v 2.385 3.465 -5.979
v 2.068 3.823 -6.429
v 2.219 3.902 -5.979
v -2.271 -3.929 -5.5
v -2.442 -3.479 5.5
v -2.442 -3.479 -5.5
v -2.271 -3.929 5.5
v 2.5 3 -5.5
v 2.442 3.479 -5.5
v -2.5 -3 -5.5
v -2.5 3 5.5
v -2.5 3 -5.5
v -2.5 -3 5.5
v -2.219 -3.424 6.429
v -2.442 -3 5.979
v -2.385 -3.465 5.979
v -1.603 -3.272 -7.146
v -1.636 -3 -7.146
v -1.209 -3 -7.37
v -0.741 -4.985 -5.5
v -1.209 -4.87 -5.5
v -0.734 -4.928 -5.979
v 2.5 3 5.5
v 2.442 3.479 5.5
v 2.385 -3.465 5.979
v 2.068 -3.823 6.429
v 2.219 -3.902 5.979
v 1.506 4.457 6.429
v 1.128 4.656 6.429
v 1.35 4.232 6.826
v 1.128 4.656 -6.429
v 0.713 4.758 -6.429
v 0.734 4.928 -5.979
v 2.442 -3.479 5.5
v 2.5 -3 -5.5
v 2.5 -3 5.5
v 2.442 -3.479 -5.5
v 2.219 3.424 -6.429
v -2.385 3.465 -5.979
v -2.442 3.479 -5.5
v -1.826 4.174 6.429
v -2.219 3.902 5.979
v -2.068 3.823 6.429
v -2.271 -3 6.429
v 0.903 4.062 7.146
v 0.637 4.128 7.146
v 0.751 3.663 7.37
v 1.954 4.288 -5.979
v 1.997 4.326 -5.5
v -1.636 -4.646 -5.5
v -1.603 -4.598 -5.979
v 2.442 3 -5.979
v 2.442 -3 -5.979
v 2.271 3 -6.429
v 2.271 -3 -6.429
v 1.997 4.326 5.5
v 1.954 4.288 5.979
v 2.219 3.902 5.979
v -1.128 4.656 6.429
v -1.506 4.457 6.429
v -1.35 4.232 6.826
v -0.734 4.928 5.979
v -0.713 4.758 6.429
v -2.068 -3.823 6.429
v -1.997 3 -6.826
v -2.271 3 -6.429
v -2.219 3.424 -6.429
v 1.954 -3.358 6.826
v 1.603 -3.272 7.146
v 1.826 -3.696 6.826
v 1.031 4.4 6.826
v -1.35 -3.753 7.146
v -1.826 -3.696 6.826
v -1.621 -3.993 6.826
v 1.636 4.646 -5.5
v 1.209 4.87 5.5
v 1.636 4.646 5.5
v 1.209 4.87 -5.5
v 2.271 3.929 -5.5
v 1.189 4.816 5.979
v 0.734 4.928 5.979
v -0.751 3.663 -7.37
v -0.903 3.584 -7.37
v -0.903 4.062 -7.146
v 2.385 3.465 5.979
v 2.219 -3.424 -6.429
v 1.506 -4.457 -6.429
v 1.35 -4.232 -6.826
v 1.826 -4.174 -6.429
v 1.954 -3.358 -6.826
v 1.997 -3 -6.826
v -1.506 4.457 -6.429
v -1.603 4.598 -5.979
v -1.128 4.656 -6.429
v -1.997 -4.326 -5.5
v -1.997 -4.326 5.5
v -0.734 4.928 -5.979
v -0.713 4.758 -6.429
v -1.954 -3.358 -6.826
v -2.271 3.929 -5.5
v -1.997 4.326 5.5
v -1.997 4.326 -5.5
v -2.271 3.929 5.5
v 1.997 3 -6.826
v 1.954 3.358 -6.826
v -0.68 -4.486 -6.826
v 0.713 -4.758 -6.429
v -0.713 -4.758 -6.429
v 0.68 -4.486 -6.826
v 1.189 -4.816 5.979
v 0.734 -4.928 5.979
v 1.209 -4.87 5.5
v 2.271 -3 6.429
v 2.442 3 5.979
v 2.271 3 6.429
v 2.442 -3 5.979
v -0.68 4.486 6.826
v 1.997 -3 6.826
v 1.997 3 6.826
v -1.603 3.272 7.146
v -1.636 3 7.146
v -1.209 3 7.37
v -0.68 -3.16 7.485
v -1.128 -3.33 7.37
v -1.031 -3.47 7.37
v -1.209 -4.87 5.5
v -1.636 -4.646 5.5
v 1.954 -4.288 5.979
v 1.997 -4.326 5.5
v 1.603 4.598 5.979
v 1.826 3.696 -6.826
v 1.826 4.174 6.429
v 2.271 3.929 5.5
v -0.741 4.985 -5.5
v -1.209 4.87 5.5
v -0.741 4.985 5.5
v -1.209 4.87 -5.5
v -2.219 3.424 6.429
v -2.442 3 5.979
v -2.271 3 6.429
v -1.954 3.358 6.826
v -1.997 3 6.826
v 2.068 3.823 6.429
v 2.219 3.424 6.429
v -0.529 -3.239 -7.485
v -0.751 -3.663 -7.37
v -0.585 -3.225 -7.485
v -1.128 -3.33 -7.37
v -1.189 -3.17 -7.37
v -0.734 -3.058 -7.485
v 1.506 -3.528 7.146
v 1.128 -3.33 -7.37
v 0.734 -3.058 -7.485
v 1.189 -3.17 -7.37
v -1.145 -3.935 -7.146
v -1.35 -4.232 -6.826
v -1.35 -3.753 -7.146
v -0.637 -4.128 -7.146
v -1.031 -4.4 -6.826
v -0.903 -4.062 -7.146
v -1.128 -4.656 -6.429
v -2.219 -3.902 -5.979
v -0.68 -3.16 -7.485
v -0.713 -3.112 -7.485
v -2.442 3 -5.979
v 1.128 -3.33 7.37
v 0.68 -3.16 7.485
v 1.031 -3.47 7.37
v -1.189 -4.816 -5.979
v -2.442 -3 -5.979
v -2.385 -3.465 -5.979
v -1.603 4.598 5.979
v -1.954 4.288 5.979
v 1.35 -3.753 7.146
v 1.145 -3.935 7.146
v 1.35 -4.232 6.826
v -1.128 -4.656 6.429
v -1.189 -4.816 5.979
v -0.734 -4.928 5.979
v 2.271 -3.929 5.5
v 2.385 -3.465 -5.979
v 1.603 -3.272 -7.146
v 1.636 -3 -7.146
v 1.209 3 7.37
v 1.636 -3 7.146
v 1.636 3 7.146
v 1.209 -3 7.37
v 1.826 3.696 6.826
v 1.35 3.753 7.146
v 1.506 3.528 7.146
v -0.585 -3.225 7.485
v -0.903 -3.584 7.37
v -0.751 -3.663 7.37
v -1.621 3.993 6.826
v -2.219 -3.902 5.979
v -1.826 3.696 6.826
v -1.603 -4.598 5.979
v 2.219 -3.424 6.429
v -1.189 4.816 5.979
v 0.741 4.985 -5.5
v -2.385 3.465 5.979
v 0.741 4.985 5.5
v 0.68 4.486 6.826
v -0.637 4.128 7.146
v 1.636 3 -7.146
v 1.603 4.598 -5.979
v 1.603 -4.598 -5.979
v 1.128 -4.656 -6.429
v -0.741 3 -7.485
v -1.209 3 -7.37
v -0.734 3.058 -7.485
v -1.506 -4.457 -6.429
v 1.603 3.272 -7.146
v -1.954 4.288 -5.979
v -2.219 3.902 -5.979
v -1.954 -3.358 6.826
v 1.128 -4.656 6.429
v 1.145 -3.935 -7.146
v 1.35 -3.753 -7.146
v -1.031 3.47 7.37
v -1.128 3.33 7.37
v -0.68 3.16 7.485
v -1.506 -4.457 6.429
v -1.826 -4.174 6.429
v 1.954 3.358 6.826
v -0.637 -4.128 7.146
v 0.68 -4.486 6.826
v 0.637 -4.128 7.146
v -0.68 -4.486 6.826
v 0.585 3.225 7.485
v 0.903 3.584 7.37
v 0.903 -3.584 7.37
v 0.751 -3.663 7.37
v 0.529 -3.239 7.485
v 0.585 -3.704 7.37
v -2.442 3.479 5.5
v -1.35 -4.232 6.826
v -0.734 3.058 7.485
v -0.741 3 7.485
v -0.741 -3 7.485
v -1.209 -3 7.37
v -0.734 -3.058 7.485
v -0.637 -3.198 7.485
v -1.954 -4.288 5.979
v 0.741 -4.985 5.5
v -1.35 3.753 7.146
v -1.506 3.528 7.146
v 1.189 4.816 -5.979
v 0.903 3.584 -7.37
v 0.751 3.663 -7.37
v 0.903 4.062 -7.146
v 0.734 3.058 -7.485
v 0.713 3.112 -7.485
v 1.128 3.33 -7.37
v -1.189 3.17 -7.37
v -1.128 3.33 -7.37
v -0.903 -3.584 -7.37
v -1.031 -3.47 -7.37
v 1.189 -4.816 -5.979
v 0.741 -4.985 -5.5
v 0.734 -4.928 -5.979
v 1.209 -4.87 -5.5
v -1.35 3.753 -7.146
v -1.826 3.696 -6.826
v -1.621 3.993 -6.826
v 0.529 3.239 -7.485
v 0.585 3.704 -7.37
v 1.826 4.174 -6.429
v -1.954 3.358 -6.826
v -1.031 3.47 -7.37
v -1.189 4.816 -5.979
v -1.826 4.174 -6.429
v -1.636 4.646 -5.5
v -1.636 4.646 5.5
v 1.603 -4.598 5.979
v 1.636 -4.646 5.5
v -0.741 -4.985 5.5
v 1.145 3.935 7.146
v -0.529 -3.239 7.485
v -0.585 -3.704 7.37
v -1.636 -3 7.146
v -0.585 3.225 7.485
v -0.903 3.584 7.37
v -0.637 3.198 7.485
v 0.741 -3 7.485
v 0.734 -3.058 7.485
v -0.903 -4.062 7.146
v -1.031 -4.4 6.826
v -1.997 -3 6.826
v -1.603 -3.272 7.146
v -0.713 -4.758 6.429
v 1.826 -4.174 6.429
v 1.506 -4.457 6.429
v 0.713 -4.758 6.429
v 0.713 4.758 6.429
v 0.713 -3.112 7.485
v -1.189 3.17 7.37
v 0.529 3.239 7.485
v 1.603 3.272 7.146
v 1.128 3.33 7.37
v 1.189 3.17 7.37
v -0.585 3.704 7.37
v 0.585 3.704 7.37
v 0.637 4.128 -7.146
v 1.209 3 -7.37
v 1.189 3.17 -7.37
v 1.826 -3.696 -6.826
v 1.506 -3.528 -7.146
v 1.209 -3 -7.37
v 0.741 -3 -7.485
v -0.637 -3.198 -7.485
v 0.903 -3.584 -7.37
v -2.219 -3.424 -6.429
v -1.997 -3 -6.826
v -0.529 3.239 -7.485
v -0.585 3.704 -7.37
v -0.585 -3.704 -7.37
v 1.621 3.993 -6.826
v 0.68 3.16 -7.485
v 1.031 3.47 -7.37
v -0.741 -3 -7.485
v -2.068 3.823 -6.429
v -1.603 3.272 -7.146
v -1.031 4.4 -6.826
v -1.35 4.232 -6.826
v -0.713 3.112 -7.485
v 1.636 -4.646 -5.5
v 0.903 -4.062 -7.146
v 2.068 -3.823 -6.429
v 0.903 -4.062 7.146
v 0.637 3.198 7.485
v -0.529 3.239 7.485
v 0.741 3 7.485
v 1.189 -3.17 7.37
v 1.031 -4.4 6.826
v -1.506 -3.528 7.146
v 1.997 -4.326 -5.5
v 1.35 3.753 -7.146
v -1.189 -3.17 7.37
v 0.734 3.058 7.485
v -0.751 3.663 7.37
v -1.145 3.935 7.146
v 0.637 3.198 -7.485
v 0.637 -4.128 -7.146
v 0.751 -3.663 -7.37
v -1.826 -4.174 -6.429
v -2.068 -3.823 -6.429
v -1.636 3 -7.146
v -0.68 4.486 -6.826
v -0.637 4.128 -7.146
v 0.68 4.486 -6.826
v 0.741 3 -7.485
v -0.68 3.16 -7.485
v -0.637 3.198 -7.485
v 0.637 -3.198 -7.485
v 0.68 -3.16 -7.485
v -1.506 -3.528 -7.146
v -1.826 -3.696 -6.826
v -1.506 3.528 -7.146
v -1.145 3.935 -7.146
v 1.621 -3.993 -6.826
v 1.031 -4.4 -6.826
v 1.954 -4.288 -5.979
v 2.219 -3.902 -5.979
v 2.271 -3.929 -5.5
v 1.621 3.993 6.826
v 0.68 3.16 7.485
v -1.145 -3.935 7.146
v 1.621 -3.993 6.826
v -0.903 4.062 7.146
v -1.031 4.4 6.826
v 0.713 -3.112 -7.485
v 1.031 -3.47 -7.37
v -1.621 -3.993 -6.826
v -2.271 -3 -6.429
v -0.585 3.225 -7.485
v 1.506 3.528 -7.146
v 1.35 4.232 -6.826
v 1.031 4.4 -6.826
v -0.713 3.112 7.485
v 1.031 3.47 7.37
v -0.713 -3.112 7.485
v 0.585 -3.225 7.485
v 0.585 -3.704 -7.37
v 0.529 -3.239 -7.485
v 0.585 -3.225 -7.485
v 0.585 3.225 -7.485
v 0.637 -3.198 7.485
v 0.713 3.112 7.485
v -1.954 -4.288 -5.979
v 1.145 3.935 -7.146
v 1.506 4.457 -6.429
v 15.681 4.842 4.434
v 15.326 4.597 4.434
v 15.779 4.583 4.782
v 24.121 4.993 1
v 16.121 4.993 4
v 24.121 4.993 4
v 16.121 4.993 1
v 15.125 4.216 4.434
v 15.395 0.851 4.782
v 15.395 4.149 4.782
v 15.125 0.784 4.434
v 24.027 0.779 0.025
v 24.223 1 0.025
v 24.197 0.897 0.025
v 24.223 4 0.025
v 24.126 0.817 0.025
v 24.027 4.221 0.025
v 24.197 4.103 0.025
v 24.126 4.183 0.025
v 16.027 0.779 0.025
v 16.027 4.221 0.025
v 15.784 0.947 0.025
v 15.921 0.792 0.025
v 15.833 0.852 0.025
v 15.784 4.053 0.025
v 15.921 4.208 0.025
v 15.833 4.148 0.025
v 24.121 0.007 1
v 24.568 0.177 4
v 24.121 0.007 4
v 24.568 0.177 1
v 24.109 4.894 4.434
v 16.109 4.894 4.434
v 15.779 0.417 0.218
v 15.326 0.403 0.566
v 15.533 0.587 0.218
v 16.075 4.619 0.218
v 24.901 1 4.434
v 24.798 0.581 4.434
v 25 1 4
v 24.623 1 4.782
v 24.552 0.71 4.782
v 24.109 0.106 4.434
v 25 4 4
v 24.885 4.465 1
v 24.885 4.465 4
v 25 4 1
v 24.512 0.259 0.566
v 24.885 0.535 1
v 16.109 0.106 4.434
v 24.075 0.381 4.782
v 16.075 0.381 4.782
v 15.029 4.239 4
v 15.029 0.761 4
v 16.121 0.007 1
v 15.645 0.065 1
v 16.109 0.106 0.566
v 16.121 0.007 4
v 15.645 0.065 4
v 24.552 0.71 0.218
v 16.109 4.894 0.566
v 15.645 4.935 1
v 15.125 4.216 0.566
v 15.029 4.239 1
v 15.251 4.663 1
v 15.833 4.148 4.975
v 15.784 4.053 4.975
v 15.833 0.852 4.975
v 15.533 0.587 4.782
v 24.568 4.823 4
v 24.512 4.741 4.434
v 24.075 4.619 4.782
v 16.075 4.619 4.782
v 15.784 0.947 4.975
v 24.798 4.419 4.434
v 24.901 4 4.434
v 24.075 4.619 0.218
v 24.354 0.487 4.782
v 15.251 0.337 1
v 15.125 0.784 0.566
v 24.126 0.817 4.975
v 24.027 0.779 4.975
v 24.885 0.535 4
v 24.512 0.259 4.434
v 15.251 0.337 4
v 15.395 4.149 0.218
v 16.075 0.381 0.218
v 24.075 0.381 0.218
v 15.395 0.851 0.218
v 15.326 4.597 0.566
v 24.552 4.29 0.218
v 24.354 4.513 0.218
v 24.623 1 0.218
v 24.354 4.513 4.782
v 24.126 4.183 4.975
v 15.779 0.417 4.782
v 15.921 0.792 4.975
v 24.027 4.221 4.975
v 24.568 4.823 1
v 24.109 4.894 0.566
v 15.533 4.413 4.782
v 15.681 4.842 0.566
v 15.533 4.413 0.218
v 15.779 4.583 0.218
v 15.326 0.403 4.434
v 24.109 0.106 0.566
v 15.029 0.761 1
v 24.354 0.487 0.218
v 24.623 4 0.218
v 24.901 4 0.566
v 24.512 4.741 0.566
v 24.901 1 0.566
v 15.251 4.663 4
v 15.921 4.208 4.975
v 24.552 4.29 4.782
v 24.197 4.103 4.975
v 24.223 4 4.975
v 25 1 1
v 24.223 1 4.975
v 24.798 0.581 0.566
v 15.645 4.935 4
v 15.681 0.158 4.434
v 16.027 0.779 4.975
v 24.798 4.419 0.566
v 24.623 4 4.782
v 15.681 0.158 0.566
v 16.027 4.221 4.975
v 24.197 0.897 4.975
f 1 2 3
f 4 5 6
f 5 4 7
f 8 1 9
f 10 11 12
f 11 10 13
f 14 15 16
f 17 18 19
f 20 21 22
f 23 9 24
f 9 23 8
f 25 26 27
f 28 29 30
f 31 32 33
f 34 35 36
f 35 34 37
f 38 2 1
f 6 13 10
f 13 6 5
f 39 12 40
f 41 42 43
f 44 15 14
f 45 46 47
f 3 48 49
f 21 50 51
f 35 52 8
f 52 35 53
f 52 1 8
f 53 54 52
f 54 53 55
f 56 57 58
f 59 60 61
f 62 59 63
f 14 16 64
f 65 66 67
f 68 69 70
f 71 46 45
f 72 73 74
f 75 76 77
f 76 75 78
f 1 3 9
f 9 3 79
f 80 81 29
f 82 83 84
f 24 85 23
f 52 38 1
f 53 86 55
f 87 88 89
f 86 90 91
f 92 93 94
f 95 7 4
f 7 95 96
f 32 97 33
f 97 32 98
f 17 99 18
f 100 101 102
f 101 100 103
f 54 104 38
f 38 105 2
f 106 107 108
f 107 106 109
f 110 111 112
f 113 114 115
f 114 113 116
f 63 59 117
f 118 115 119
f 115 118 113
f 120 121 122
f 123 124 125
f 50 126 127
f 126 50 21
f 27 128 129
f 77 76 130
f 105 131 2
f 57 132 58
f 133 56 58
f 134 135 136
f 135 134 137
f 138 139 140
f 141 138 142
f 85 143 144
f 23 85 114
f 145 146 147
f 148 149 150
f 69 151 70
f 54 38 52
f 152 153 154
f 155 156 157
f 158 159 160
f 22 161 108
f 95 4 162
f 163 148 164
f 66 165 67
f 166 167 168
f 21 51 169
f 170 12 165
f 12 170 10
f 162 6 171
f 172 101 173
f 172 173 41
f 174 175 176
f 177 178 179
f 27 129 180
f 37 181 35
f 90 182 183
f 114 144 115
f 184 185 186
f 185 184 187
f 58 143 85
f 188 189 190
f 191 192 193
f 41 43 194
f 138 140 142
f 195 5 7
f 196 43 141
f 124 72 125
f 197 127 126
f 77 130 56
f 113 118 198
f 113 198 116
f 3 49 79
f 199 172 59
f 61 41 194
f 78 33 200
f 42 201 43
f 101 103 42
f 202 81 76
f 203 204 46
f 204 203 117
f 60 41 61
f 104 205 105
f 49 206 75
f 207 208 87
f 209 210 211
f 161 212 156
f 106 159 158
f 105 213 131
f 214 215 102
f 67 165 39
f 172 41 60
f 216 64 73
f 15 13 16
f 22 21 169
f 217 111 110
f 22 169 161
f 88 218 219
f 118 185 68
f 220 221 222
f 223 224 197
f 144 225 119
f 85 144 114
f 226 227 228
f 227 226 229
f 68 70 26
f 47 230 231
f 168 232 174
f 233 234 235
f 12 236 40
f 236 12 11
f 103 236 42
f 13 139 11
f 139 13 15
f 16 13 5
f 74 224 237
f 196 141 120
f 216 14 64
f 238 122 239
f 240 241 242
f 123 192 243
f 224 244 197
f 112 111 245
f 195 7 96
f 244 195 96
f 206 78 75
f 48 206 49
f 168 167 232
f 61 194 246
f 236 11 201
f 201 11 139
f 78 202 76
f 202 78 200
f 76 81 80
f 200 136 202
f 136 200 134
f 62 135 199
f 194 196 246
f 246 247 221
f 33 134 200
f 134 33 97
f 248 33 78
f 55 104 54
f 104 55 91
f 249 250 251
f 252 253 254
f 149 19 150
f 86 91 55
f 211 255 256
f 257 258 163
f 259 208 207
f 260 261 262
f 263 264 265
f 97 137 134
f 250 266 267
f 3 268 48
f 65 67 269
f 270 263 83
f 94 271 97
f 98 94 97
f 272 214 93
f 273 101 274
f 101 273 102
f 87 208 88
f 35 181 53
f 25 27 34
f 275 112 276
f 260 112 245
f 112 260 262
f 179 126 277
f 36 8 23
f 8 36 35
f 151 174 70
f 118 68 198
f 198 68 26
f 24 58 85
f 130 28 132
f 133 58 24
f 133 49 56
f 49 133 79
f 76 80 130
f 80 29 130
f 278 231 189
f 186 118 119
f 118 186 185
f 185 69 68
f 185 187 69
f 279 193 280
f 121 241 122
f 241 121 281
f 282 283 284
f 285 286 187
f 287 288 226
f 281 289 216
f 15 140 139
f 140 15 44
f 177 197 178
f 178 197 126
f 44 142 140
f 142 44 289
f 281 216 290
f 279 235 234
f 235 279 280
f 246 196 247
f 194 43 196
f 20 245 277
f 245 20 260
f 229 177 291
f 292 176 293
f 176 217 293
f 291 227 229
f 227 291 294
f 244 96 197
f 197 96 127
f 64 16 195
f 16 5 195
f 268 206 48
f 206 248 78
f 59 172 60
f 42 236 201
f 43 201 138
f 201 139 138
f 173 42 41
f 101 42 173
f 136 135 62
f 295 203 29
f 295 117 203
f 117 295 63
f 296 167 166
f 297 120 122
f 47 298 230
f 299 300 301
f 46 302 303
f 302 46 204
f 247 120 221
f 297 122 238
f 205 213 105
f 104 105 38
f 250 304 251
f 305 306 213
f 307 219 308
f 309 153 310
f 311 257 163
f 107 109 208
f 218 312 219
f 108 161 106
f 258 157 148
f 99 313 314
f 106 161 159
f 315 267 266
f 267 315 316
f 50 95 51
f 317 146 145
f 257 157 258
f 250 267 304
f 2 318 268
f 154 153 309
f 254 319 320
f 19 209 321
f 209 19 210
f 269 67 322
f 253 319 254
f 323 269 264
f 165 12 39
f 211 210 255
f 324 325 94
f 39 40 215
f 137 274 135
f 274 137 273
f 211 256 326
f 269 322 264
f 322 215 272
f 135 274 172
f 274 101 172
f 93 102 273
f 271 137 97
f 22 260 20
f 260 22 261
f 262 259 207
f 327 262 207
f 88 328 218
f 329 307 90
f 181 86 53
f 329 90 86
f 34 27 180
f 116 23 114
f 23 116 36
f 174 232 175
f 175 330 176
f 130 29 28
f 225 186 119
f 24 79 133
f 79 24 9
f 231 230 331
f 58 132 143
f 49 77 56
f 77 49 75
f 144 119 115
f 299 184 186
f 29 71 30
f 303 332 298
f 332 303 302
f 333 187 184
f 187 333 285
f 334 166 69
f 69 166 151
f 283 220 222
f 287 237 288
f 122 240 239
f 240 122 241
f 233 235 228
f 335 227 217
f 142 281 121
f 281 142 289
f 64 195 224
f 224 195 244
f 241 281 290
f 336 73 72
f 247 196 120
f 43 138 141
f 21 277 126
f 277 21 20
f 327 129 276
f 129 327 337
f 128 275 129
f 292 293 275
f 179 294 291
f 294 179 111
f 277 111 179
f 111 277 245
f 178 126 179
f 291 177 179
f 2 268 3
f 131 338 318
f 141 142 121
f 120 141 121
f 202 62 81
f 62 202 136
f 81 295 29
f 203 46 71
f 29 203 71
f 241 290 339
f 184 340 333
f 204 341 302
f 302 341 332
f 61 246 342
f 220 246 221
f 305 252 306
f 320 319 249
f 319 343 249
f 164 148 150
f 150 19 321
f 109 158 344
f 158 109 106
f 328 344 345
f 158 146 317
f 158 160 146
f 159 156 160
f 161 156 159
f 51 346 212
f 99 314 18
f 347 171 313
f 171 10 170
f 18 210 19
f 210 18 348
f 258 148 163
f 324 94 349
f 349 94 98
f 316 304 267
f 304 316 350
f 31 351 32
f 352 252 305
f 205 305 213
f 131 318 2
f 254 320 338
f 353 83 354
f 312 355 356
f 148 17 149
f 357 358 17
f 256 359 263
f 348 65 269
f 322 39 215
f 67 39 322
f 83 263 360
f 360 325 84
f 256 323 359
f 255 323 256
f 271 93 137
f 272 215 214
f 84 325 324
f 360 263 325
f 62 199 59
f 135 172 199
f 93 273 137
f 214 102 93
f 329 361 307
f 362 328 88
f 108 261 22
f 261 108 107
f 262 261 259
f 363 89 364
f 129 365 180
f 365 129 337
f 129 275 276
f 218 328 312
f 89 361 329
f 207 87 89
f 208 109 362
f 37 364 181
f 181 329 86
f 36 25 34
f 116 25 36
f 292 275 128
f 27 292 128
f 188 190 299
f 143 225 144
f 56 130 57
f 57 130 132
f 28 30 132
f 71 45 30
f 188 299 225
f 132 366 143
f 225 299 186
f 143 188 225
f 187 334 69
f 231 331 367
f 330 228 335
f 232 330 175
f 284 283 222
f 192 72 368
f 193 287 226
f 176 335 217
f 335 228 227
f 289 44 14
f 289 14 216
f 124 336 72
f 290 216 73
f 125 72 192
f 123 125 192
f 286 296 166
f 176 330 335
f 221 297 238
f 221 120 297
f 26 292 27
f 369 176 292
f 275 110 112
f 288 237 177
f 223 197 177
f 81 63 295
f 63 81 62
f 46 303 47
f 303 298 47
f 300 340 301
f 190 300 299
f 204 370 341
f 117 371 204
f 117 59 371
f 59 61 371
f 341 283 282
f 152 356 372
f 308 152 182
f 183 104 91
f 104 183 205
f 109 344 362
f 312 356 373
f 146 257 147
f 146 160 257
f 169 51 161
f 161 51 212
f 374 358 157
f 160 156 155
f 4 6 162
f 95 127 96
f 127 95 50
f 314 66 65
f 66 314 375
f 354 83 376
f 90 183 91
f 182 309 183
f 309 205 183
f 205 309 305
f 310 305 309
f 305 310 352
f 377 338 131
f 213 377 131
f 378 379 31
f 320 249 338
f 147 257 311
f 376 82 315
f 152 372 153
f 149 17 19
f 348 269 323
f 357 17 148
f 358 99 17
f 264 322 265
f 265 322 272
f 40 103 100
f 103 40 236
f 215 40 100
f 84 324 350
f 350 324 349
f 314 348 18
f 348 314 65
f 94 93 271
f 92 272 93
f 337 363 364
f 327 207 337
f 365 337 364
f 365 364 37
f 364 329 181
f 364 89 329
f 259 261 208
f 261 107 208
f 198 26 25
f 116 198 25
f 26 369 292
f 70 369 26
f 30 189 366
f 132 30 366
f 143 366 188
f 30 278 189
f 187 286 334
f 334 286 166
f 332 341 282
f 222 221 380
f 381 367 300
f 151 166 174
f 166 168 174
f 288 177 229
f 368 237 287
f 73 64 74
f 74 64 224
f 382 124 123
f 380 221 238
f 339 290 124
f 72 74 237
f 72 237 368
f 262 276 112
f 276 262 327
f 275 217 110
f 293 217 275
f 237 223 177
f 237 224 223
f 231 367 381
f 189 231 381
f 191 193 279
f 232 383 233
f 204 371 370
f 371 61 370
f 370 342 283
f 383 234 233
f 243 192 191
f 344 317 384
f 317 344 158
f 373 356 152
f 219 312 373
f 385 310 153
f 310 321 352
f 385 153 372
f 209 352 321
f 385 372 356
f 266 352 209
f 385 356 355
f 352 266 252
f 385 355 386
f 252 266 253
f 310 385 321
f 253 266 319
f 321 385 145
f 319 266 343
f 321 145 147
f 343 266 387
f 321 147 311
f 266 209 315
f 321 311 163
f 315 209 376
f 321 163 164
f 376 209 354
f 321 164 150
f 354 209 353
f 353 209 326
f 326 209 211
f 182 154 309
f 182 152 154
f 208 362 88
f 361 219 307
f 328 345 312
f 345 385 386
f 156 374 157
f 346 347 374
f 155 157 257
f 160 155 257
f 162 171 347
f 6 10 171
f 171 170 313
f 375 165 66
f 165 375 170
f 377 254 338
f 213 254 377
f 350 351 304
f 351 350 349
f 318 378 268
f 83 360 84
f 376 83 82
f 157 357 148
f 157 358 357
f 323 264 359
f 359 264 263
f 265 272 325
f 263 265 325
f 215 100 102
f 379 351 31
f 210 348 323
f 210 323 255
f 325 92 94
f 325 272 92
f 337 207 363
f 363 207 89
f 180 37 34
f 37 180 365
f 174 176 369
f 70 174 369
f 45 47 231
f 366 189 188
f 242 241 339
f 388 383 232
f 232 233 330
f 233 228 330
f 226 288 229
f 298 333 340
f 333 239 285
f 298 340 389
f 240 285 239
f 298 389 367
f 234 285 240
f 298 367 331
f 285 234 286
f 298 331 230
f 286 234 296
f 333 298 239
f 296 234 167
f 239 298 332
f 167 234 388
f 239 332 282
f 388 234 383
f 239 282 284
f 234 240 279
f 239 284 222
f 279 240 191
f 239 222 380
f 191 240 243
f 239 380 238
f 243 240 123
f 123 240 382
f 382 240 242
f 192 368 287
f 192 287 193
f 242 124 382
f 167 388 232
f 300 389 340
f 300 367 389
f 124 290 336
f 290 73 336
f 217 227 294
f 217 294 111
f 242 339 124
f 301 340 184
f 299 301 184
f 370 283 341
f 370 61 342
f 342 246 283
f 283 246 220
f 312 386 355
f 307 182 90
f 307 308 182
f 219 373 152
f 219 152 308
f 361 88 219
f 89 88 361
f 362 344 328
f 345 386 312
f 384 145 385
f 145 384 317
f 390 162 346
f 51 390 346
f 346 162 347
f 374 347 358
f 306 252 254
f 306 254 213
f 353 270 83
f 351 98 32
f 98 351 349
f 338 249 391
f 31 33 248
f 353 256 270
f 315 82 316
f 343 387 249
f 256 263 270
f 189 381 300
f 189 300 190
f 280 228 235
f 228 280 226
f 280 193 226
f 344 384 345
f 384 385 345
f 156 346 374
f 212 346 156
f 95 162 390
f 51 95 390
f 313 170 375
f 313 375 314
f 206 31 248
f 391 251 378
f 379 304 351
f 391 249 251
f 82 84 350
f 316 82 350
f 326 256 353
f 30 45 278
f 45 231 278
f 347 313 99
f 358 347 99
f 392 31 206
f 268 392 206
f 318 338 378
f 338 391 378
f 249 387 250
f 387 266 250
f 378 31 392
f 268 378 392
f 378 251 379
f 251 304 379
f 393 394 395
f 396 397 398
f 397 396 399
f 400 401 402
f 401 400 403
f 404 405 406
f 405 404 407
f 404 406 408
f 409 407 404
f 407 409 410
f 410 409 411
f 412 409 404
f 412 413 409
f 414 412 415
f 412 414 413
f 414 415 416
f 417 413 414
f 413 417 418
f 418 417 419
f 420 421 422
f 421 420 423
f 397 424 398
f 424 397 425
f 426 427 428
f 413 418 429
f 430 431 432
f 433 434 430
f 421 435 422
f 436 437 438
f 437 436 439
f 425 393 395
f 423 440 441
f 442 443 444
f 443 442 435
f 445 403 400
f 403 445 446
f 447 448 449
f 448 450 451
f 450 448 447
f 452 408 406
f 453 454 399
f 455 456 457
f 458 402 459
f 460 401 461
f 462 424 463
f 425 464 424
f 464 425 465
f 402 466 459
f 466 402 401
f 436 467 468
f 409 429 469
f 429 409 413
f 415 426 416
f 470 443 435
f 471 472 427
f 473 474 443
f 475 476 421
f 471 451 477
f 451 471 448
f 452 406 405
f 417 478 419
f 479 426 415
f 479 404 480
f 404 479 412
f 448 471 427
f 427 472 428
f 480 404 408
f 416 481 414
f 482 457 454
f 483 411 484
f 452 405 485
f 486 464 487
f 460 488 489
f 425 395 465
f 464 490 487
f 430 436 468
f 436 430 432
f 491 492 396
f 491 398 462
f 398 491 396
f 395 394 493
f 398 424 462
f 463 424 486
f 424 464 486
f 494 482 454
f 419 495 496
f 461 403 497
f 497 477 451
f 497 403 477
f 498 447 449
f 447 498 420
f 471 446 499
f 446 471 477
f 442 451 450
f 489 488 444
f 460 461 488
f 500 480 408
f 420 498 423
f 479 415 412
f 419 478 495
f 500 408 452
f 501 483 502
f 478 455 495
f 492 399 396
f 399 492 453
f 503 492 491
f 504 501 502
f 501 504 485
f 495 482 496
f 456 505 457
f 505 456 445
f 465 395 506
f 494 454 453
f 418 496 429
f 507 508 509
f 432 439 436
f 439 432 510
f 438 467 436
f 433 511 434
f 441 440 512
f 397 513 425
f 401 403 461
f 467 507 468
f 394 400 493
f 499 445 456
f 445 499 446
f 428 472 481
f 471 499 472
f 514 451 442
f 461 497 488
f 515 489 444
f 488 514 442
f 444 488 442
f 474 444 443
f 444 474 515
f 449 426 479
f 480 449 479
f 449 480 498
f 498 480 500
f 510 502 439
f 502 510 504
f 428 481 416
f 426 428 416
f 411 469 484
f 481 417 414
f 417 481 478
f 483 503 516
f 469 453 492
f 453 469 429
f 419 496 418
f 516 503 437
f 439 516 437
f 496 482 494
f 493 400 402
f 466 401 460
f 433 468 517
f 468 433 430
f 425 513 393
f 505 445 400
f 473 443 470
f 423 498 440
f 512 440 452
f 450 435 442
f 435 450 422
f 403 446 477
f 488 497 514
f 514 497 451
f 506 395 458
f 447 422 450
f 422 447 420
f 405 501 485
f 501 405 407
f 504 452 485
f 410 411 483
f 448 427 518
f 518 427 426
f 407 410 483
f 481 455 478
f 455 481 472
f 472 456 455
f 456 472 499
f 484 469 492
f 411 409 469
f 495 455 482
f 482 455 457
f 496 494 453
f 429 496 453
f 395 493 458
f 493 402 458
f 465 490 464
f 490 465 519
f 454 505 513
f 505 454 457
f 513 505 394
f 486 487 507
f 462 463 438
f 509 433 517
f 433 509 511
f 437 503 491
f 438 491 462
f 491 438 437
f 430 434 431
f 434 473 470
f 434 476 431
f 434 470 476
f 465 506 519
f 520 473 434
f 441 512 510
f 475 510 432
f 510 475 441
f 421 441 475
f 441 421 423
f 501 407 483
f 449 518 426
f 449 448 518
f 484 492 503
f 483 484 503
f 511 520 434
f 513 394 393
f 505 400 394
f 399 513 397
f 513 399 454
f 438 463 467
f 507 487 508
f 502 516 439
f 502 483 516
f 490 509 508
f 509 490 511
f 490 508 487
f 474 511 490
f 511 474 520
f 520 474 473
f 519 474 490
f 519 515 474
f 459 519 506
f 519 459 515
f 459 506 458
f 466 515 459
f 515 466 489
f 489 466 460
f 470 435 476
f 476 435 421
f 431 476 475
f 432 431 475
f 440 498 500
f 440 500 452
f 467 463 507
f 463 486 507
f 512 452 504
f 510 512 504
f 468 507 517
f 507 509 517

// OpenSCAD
/*
 * This work by John Strunk is licensed under the Creative Commons
 * Attribution-ShareAlike 4.0 International License. To view a copy of
 * this license, visit http://creativecommons.org/licenses/by-sa/4.0/
 * or send a letter to Creative Commons, 444 Castro Street, Suite 900,
 * Mountain View, California, 94041, USA.
 */

/*
 * Create a cube with rounded edges.
 * size: Vector containing the overall external size of the cube
 * center: Whether the rcube should be centered on the origin
 * r: Radius of the edges
 */
module rcube(size = [1, 1, 1],
             center = false,
             r = 1e-6) {

    // Amount each point should be shifted to "center" the object
    dx = center ? size[0]/2 : 0;
    dy = center ? size[1]/2 : 0;
    dz = center ? size[2]/2 : 0;
    
    /*
     * The rcube is formed by generating the hull around 8 spheres
     * that are positioned at the corners of the cube. Sphere centers
     * are placed inside the finished dimensions by r to ensure the
     * resulting hull is the correct size.
     */
    hull() {
        translate([r-dx, r-dy, r-dz]) sphere(r=r);
        translate([size[0]-r-dx, r-dy, r-dz]) sphere(r=r);
        translate([r-dx, size[1]-r-dy, r-dz]) sphere(r=r);
        translate([size[0]-r-dx, size[1]-r-dy, r-dz]) sphere(r=r);
        translate([r-dx, r-dy, size[2]-r-dz]) sphere(r=r);
        translate([size[0]-r-dx, r-dy, size[2]-r-dz]) sphere(r=r);
        translate([r-dx, size[1]-r-dy, size[2]-r-dz]) sphere(r=r);
        translate([size[0]-r-dx, size[1]-r-dy, size[2]-r-dz]) sphere(r=r);
    };
}

$fa = 1;
$fs = 0.5;
rcube([5, 10, 15], true, 2);
translate([15, 0, 0]) rcube([10, 5, 5], false, 1);
